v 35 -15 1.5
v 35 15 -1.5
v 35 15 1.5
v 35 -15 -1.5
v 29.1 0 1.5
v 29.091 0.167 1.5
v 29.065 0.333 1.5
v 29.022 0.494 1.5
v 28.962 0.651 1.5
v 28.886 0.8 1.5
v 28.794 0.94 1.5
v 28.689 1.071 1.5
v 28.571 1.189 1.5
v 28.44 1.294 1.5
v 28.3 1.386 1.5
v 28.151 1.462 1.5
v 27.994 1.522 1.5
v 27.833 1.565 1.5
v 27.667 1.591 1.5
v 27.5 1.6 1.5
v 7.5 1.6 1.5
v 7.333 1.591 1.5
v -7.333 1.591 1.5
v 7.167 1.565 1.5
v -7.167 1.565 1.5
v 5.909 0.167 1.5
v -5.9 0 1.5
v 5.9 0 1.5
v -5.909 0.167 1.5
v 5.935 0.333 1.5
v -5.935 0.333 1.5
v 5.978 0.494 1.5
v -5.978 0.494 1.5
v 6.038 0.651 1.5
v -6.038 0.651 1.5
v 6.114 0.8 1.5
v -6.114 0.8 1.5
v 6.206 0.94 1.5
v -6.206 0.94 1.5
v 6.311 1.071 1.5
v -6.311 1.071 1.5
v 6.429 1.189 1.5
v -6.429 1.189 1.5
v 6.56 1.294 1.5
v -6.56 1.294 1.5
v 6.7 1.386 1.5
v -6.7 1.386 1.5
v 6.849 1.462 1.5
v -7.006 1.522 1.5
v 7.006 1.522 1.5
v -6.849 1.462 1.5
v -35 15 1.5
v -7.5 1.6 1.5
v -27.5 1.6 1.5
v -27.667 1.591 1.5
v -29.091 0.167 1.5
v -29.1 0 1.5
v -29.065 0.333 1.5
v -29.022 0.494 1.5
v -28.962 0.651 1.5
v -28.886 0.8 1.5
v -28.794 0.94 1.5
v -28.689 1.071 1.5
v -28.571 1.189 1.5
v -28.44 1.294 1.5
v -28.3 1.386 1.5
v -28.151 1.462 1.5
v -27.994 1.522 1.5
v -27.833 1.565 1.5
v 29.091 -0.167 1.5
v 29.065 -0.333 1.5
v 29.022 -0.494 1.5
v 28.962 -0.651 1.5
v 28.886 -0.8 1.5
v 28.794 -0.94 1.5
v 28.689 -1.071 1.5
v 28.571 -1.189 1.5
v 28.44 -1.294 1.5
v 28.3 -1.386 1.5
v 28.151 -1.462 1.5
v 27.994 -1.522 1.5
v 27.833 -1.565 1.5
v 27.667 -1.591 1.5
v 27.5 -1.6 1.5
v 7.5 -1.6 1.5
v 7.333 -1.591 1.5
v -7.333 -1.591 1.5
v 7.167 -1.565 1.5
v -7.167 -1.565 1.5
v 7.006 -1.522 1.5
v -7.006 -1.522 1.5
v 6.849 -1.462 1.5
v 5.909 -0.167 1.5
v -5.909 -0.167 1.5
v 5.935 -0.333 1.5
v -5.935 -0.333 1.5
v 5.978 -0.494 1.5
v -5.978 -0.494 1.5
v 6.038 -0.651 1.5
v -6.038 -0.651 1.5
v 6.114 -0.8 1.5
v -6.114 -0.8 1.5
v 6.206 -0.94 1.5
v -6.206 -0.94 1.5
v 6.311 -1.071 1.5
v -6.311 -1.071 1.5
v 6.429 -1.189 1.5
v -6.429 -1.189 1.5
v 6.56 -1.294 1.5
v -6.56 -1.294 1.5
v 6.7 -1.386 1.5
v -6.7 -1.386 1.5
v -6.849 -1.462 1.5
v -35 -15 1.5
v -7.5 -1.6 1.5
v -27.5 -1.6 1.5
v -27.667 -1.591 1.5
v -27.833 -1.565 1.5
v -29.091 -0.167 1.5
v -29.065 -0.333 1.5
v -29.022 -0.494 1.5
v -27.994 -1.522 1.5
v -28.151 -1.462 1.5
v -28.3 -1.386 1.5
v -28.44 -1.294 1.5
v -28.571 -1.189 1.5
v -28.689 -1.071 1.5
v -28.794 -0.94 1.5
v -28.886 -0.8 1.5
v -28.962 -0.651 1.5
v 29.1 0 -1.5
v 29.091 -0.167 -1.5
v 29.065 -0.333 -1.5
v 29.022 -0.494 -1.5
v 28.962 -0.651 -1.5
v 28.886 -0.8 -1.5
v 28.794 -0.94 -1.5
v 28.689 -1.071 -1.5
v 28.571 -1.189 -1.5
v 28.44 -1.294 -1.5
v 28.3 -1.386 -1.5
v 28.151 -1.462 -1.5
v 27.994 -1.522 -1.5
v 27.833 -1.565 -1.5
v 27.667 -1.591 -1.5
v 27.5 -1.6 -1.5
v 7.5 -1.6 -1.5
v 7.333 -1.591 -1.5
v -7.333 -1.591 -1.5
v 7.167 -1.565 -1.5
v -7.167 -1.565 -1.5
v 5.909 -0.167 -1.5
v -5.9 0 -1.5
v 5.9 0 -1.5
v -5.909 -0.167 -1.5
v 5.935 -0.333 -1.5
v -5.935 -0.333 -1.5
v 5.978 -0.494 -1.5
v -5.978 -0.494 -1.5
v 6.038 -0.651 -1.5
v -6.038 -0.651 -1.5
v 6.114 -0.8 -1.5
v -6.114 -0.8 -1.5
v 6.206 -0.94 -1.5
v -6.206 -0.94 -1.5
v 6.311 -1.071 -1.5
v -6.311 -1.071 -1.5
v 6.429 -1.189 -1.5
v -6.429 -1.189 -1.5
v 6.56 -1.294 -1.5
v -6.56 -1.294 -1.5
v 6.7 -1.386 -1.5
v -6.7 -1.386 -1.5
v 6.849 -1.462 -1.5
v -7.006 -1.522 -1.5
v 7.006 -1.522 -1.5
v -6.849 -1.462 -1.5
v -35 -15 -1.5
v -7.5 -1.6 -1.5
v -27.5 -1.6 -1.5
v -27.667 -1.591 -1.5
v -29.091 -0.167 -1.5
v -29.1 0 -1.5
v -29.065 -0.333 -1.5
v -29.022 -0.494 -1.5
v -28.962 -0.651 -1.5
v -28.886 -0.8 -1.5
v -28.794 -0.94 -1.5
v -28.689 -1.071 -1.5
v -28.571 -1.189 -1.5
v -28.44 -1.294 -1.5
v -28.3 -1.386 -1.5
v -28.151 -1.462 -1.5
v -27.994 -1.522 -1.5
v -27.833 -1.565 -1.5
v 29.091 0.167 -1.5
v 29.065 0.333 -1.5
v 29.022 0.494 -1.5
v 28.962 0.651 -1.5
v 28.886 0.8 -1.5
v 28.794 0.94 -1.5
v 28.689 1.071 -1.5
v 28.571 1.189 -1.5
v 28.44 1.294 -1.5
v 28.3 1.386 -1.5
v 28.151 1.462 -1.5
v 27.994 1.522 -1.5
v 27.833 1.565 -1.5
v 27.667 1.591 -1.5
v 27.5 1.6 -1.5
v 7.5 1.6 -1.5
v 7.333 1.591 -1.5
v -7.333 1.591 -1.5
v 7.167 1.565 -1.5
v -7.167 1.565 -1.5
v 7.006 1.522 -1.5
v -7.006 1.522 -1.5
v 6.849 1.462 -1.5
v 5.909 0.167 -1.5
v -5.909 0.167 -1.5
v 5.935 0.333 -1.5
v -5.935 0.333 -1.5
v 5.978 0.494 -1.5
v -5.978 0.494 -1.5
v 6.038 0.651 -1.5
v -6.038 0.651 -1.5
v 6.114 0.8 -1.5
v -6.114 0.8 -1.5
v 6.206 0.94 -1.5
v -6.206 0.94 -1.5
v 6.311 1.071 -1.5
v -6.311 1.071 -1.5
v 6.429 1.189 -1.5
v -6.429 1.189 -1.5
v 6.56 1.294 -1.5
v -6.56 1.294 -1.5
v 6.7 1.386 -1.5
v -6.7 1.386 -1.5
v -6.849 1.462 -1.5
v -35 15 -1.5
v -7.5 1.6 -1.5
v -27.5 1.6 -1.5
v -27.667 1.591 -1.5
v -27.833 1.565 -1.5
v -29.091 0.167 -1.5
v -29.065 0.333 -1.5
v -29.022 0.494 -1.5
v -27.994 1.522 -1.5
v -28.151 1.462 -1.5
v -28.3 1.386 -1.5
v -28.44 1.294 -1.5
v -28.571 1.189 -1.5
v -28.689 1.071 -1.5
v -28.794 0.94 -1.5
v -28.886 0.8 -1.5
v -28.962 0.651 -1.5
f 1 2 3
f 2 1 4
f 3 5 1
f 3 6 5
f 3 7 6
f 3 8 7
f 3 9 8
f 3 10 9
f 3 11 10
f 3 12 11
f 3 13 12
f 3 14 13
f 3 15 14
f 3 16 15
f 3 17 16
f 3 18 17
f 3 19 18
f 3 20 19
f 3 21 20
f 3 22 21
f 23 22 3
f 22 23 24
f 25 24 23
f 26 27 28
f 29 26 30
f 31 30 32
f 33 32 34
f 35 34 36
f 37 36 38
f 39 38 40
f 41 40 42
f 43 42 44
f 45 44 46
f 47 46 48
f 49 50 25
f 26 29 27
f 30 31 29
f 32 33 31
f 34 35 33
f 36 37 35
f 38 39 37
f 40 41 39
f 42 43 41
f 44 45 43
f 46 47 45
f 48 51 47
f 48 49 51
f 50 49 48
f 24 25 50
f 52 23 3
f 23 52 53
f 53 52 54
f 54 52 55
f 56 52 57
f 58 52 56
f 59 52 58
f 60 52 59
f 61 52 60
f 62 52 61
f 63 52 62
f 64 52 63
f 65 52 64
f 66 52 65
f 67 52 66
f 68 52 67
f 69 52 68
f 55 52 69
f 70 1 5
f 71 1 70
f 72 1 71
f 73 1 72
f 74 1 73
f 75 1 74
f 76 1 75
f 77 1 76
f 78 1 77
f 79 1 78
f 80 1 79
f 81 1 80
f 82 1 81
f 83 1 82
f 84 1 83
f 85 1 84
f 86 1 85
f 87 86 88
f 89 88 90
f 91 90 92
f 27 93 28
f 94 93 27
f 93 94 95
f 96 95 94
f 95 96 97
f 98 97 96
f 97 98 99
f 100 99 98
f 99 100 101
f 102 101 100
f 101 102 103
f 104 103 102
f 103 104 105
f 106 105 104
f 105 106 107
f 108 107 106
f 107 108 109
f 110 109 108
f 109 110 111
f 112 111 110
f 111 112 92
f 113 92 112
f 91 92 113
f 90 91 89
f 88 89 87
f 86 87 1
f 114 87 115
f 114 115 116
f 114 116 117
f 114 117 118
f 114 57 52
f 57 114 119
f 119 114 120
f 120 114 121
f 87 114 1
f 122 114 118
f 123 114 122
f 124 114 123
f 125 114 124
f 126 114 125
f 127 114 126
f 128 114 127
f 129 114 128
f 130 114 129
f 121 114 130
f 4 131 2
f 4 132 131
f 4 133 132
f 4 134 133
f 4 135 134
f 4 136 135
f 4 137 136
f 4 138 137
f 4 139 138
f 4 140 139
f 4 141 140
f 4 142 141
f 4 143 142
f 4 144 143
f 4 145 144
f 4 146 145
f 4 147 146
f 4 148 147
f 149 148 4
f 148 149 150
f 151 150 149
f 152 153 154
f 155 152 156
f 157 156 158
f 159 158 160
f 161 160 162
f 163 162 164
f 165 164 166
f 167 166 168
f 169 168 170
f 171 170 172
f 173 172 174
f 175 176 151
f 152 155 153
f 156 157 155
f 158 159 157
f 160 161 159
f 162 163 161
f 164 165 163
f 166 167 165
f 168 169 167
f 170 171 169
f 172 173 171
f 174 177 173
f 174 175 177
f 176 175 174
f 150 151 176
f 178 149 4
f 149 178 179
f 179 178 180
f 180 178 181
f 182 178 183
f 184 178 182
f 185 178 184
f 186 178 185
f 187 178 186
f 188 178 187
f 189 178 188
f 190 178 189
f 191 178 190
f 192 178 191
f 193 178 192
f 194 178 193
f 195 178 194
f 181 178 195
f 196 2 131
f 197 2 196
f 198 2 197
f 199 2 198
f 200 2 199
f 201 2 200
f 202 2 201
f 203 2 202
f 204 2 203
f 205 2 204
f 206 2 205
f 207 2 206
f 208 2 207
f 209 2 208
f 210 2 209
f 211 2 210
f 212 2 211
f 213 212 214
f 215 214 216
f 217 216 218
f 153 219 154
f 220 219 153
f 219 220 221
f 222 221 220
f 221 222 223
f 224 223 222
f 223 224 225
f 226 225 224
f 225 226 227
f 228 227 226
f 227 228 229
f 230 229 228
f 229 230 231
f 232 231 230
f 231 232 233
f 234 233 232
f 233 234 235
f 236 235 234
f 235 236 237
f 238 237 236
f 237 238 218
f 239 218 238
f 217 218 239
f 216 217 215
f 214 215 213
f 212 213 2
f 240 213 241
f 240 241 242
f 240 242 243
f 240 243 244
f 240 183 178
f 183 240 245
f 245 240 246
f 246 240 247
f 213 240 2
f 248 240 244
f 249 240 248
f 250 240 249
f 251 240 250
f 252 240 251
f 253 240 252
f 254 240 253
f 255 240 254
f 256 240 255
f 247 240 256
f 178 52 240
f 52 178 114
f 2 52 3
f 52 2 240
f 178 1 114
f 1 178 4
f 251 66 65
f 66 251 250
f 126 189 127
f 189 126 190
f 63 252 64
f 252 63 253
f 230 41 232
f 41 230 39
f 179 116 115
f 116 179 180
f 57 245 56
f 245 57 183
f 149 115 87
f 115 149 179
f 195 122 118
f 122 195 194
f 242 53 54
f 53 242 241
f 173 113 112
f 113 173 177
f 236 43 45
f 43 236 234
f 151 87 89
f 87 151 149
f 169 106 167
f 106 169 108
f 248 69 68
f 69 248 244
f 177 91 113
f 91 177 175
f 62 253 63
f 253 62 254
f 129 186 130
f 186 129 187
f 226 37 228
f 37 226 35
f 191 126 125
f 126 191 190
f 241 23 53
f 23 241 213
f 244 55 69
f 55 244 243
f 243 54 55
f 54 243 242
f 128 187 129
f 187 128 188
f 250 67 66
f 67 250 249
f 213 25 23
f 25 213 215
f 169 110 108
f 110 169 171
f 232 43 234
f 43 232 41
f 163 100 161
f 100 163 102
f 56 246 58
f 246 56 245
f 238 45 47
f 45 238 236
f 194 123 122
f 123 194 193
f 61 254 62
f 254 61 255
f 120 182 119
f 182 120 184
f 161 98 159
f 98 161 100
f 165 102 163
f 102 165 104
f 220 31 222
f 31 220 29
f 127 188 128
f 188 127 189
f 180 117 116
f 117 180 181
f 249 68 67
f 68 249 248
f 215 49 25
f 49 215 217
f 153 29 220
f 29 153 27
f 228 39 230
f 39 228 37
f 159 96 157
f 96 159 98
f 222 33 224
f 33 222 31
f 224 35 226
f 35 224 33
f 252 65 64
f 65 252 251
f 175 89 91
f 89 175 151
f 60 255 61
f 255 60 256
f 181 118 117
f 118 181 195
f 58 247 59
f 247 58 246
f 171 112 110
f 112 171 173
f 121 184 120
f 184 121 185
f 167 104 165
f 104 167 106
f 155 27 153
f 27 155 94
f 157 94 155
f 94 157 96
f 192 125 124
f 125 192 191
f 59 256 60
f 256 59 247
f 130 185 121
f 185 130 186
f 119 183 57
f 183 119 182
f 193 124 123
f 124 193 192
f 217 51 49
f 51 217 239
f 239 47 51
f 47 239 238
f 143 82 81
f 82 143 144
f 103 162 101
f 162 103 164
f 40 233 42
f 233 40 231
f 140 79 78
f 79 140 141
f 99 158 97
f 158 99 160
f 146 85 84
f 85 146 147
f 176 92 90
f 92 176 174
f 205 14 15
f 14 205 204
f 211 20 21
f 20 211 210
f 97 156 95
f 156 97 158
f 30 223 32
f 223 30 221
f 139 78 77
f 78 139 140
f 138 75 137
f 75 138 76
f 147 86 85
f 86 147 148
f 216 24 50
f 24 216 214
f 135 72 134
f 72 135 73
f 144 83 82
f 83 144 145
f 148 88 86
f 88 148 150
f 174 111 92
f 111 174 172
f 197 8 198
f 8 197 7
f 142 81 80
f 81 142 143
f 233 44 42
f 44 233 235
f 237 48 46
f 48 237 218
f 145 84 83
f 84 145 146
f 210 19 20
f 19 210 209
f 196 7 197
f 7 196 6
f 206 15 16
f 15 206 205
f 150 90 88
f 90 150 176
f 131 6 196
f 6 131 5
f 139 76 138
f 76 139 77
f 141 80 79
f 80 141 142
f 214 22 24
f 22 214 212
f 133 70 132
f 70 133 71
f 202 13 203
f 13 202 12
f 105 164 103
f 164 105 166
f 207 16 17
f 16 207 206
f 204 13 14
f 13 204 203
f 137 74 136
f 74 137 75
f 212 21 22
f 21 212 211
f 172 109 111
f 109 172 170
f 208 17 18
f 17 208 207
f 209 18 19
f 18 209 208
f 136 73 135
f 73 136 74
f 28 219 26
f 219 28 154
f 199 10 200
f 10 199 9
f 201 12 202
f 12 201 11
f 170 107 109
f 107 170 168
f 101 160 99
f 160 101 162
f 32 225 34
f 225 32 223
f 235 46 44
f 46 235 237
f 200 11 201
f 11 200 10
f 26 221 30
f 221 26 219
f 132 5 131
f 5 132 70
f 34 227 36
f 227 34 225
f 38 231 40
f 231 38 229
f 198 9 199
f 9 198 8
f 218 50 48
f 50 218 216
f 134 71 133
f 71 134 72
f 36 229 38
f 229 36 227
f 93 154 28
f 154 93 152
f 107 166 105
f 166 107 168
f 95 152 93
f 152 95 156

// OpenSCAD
// Limit-switch mounting plate.
$fn = 60;
eps = 0.02;
plate_l = 70;
plate_w = 30;
plate_t = 3;
slot_l = 20;
module slot(x) { hull() { translate([x-slot_l/2,0,-plate_t/2-eps]) cylinder(d=3.2,h=plate_t+2*eps); translate([x+slot_l/2,0,-plate_t/2-eps]) cylinder(d=3.2,h=plate_t+2*eps); } }
difference() { cube([plate_l,plate_w,plate_t],center=true); slot(-plate_l/4); slot(plate_l/4); }
